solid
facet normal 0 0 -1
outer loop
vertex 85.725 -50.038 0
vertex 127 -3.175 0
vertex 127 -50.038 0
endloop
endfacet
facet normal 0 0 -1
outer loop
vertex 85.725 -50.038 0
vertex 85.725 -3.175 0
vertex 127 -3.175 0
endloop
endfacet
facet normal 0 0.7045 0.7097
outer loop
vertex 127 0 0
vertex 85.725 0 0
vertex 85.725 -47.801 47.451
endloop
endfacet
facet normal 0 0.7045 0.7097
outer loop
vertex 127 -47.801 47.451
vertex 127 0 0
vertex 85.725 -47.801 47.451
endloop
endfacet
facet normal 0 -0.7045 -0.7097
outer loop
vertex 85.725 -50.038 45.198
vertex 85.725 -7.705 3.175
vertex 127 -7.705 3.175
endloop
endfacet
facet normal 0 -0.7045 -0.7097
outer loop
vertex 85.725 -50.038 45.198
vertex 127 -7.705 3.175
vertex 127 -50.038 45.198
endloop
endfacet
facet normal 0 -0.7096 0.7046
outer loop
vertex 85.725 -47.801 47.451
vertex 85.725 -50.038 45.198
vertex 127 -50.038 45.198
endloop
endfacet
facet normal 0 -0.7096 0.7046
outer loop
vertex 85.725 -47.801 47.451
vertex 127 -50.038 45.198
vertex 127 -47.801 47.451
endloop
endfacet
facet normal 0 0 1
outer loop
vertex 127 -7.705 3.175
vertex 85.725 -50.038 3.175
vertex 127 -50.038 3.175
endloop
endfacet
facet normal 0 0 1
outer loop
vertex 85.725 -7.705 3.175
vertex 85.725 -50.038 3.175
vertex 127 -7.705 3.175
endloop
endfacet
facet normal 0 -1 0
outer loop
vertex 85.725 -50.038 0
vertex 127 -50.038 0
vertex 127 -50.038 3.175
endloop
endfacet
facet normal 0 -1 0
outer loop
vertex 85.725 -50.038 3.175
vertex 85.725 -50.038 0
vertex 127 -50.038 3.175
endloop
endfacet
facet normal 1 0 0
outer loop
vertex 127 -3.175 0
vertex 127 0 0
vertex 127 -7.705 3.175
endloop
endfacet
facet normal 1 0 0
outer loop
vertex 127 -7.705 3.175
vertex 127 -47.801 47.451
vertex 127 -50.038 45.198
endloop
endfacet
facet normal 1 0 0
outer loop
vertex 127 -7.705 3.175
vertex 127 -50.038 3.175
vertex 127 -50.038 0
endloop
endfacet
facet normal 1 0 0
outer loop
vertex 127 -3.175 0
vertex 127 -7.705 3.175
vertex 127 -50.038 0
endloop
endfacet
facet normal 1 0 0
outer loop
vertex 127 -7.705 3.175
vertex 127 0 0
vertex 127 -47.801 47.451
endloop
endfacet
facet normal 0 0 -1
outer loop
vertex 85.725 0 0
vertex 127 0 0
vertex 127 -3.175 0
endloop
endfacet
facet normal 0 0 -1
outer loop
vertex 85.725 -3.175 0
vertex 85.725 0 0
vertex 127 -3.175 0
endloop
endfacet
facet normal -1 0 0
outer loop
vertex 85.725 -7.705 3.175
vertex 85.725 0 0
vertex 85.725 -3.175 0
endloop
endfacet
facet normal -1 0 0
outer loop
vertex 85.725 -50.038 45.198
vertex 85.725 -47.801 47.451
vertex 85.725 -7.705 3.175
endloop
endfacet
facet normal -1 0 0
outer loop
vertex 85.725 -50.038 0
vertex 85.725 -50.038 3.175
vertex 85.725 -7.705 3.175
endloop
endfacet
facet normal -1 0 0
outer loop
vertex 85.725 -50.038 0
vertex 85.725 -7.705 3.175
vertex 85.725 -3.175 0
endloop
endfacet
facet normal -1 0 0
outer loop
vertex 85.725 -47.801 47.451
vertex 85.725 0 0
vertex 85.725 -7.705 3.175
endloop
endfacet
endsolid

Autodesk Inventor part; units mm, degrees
ref_plane "YZ Plane" through (0, 0, 0) normal (1, 0, 0) x (0, 1, 0)
ref_plane "XZ Plane" through (0, 0, 0) normal (0, 1, 0) x (-1, 0, 0)
ref_plane "Work Plane1" through (85.725, 80.736, -75.2679) normal (-1, 0, 0) x (0, -0.7045, -0.7097)
sketch "Sketch1" plane through (85.725, 80.736, -75.2679) normal (-1, 0, 0) x (0, -0.7045, -0.7097)
  line L0 (3.4608, 0) -> (3.4607, 241.3) projected
  line L1 (5.6975, 112.5782) -> (38.7126, 145.837) projected
  line L2 (3.4608, 110.3249) -> (5.6975, 112.5782) projected
  line L3 (38.7126, 145.837) -> (36.4593, 148.0738)
  line L4 (36.4593, 148.0738) -> (6.6358, 118.0301)
  line L5 (6.6358, 118.0301) -> (6.6358, 177.6787)
  line L6 (6.6358, 177.6787) -> (3.4607, 177.6787)
  line L7 (3.4607, 177.6787) -> (3.4608, 110.3249)
  line L8 (3.4608, 110.3249) -> (38.7126, 145.837)
  dimension "d0" = 3.175
  dimension "d1" = 3.175
extrude "Extrusion1" add sketch "Sketch1" against normal blind 41.275
properties part number "Support"
